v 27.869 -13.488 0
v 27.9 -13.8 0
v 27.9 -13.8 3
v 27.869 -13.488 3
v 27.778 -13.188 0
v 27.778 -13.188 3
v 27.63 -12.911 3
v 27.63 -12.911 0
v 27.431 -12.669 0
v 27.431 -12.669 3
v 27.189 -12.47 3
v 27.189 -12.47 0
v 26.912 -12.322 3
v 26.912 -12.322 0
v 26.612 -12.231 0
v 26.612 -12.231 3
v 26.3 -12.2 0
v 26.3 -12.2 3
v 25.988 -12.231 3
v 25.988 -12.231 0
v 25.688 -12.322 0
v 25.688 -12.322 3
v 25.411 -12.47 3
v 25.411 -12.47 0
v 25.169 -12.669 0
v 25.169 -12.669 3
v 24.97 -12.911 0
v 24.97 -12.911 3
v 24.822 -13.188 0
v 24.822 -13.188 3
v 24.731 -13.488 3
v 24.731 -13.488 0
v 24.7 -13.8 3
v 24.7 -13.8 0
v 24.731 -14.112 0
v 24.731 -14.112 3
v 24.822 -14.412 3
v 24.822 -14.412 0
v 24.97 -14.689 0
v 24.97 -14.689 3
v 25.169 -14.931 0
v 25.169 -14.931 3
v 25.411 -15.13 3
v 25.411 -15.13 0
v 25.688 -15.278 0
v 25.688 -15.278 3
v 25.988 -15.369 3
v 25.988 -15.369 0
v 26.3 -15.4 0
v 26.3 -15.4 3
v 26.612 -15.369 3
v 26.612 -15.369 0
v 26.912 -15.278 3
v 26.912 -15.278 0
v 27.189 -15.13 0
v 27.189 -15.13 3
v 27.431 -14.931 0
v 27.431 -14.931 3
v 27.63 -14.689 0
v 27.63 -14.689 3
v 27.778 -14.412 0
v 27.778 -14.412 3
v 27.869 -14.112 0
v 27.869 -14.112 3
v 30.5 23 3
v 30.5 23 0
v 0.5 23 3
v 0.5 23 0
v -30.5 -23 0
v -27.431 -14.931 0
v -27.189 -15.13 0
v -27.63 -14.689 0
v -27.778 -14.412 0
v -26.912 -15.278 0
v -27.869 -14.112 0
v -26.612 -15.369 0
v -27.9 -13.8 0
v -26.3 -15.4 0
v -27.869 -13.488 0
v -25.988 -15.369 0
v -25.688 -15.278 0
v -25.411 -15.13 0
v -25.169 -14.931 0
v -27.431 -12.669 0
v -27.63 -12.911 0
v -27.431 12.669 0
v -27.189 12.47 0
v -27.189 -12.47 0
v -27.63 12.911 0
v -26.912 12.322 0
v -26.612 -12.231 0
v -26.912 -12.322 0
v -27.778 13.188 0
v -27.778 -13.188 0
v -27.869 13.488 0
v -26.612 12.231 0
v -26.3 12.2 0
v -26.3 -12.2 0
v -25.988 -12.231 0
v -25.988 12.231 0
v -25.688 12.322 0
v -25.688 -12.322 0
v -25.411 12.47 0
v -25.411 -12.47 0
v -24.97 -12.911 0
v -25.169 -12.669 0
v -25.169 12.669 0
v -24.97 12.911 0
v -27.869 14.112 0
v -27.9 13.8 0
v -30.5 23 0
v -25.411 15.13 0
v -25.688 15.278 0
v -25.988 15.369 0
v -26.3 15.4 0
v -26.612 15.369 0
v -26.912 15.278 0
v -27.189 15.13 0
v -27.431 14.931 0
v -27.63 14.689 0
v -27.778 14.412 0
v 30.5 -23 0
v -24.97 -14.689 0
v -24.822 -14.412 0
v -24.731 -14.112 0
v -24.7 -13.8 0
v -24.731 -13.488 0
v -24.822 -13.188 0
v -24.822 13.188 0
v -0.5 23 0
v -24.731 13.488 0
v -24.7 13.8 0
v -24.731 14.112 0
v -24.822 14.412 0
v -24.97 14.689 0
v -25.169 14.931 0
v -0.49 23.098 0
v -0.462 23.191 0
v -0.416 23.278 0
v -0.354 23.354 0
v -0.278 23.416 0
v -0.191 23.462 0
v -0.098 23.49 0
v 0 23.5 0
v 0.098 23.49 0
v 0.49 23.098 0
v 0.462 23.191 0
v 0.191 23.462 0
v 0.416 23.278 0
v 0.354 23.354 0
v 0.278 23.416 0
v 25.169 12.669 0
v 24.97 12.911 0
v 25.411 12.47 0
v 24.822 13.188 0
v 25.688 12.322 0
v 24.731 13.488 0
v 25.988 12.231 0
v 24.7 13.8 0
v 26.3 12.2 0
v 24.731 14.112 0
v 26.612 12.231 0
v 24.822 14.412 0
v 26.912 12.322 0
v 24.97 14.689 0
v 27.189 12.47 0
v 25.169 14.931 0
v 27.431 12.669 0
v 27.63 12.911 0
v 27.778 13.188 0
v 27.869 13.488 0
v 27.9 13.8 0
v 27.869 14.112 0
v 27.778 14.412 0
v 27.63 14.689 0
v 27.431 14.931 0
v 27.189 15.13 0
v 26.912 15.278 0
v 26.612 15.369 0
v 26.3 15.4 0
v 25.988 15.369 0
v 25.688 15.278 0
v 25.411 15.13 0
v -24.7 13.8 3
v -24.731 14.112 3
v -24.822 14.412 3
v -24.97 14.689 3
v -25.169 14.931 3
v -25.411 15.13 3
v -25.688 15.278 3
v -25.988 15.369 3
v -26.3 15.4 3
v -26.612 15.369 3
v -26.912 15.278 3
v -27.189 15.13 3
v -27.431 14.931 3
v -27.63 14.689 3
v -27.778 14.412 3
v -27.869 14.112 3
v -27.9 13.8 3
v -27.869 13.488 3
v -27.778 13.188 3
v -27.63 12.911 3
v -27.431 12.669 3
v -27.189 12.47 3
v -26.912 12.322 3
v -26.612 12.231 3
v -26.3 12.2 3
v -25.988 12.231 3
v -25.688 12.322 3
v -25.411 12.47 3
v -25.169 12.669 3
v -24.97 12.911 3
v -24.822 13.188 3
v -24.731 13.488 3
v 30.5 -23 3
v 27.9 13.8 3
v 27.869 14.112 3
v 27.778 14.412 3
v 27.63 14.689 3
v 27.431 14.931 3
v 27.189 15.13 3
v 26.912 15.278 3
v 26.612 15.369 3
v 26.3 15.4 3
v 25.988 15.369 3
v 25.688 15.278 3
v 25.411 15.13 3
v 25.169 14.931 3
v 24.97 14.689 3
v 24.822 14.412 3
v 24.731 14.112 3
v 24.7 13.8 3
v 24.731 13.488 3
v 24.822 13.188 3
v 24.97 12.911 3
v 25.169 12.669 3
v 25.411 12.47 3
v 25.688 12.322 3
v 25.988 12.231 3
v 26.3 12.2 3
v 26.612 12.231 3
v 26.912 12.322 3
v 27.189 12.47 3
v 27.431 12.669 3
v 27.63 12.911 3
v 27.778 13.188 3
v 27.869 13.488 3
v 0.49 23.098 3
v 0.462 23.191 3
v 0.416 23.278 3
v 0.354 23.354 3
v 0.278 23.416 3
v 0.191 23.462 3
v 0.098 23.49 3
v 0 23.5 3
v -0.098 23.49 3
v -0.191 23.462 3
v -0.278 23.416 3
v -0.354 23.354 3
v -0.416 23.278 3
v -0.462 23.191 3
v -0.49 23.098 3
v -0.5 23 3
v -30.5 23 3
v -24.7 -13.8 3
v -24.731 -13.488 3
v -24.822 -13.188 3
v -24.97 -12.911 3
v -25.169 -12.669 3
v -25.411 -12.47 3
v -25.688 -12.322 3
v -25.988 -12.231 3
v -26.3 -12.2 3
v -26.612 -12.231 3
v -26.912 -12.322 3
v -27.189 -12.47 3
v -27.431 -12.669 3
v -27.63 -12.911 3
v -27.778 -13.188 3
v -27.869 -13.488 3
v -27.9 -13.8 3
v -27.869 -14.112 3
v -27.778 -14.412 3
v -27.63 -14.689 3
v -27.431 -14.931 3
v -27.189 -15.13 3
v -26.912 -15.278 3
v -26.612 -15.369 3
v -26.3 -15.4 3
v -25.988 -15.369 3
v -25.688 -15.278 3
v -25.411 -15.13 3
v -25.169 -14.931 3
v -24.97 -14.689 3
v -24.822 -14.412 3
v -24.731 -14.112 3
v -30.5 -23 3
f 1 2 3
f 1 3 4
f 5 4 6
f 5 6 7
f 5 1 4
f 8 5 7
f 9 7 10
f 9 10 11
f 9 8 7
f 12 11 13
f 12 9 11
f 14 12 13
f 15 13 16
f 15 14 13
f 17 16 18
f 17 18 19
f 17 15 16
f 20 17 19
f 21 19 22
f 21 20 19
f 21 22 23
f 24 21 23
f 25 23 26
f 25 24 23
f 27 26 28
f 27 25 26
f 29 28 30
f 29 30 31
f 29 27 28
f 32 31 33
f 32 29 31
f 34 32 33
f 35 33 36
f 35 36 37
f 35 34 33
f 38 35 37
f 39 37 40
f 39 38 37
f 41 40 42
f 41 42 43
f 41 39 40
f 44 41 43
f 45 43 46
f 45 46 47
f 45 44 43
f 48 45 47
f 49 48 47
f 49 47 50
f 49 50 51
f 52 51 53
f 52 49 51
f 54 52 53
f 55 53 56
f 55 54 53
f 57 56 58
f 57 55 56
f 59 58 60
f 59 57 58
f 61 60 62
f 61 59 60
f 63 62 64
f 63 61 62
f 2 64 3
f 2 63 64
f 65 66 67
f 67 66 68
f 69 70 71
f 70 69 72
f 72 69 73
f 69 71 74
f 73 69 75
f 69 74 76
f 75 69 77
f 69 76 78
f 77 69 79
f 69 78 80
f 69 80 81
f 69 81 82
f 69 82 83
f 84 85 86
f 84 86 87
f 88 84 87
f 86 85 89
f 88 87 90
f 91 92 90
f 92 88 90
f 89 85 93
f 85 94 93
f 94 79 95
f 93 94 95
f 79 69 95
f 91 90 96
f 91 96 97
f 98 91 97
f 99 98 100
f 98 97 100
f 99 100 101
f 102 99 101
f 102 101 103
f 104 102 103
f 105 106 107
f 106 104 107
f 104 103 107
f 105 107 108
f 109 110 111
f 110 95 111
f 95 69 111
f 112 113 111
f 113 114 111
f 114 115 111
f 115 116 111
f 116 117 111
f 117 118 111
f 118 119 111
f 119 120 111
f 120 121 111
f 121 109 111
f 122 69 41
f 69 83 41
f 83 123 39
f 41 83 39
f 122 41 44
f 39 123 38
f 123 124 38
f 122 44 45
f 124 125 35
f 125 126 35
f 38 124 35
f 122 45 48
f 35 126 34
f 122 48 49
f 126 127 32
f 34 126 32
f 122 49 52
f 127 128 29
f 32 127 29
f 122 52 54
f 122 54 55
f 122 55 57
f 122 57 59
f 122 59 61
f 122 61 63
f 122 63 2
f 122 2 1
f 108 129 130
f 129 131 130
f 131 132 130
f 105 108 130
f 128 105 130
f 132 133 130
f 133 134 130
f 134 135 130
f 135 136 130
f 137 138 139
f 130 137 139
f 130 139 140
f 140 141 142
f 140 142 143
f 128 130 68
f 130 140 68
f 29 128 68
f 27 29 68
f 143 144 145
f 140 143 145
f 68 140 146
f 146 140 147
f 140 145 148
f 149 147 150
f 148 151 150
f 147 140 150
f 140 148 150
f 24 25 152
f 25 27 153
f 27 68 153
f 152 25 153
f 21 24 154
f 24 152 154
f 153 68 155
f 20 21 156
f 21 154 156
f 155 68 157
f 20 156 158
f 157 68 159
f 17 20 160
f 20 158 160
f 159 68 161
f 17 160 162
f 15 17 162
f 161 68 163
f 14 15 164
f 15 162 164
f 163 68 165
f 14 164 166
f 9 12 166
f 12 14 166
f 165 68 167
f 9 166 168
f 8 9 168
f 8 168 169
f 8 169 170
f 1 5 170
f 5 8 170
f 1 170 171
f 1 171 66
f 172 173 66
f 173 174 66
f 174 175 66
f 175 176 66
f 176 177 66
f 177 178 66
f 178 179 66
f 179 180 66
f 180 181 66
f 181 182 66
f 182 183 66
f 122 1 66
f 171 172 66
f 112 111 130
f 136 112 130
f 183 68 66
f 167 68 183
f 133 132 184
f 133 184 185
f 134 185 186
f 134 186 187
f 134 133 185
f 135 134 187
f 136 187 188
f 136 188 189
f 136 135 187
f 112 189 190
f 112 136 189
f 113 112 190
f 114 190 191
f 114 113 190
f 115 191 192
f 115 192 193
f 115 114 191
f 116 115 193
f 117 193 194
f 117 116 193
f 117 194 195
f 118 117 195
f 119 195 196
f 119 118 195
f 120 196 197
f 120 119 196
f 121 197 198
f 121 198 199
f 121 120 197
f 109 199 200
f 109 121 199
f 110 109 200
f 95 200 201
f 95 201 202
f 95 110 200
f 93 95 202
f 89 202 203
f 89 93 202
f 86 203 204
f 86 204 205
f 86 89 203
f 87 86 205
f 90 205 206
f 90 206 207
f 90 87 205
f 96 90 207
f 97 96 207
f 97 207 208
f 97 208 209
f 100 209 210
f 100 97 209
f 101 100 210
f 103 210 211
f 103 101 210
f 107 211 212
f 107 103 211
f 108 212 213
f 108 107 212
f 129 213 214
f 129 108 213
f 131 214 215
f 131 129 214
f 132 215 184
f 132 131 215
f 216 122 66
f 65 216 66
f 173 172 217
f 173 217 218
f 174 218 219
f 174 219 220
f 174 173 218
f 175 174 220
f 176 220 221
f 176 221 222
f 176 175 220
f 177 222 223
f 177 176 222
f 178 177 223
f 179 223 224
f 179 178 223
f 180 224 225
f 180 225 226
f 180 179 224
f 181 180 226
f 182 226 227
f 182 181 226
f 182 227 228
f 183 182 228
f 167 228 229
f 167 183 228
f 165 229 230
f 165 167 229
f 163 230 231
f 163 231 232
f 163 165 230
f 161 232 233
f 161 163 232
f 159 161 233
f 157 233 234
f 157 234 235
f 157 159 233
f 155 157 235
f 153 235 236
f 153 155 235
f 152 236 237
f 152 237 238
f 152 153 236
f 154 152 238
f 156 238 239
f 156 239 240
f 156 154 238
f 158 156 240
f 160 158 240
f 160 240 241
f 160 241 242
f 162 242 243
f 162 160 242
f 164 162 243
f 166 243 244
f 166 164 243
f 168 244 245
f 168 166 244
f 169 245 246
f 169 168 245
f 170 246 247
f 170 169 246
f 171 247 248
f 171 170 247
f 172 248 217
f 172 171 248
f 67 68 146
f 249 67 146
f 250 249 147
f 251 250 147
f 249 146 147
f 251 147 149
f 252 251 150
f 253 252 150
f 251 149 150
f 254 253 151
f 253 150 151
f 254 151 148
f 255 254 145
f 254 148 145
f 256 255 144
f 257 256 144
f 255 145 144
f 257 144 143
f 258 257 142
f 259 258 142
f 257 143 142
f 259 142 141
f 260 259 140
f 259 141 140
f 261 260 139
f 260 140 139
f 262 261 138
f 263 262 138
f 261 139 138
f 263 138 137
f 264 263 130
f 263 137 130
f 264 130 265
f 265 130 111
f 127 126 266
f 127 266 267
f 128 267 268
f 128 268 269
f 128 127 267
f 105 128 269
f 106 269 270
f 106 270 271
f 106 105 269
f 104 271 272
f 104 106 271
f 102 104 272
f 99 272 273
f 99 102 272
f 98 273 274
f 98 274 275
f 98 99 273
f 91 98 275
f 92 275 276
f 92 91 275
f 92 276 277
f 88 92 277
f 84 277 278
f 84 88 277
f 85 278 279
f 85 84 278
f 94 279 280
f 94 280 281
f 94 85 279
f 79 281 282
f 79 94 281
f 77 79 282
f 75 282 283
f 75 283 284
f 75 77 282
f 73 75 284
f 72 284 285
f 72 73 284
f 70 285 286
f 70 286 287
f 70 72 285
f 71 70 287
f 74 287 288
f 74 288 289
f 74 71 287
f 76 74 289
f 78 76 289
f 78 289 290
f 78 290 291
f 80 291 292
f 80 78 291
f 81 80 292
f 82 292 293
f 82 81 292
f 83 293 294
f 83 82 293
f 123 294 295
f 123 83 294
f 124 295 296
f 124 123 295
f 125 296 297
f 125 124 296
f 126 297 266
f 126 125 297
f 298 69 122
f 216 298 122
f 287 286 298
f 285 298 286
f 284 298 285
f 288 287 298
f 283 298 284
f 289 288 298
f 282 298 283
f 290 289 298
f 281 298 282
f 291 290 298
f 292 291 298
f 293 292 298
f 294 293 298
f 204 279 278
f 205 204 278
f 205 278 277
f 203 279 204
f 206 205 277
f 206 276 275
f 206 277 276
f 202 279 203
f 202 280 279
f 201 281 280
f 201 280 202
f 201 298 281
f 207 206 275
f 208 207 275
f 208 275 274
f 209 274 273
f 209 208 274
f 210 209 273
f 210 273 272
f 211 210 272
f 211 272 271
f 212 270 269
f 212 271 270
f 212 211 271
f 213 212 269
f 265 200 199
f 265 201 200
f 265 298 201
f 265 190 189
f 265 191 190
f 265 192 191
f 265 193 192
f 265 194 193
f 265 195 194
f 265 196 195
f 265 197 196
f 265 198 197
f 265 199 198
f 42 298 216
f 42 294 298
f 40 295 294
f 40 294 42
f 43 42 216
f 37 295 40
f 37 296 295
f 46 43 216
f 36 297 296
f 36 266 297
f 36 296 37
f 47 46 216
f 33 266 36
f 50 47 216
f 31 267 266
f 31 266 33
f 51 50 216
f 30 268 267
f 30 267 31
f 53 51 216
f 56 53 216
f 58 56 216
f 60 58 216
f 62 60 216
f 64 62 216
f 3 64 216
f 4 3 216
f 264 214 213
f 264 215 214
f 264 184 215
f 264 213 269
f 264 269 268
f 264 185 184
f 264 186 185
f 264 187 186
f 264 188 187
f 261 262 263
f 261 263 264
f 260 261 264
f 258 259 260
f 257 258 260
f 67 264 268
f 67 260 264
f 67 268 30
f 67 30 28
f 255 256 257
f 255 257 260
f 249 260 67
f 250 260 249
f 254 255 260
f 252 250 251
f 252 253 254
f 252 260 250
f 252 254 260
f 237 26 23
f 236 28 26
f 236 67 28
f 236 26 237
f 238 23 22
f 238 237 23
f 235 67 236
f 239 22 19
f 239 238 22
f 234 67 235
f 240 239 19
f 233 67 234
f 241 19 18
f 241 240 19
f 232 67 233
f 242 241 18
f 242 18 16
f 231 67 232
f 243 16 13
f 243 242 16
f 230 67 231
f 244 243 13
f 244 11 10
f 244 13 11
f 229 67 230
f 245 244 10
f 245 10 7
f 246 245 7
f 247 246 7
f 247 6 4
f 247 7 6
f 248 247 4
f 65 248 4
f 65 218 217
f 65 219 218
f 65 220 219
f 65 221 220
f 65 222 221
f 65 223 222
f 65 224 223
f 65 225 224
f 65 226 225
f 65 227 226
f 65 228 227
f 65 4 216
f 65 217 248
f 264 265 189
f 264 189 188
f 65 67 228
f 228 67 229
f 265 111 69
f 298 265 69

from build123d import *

# Parameters (mm, degrees)
F0_R     = 1.6
F1_DEPTH = 3


with BuildPart() as f1:
    # F0 (on Top) → F1 (new body)
    with BuildSketch(Plane.XY):
        with BuildLine():
            ThreePointArc((-0.5, 23), (0, 22.5), (0.5, 23))
            Line((0.5, 23), (-0.5, 23))
        make_face()
        with BuildLine():
            Line((-0.5, 23), (0.5, 23))
            ThreePointArc((0.5, 23), (0, 23.5), (-0.5, 23))
        make_face()
        with BuildLine():
            Line((30.5, 23), (0.5, 23))
            ThreePointArc((0.5, 23), (0, 22.5), (-0.5, 23))
            Line((-0.5, 23), (-30.5, 23))
            Line((-30.5, 23), (-30.5, -23))
            Line((-30.5, -23), (30.5, -23))
            Line((30.5, -23), (30.5, 23))
        make_face()
        with Locations((-26.3, -13.8)):
            Circle(F0_R, mode=Mode.SUBTRACT)
        with Locations((26.3, -13.8)):
            Circle(F0_R, mode=Mode.SUBTRACT)
        with Locations((-26.3, 13.8)):
            Circle(F0_R, mode=Mode.SUBTRACT)
        with Locations((26.3, 13.8)):
            Circle(F0_R, mode=Mode.SUBTRACT)
    extrude(amount=F1_DEPTH)


solid = f1.part
